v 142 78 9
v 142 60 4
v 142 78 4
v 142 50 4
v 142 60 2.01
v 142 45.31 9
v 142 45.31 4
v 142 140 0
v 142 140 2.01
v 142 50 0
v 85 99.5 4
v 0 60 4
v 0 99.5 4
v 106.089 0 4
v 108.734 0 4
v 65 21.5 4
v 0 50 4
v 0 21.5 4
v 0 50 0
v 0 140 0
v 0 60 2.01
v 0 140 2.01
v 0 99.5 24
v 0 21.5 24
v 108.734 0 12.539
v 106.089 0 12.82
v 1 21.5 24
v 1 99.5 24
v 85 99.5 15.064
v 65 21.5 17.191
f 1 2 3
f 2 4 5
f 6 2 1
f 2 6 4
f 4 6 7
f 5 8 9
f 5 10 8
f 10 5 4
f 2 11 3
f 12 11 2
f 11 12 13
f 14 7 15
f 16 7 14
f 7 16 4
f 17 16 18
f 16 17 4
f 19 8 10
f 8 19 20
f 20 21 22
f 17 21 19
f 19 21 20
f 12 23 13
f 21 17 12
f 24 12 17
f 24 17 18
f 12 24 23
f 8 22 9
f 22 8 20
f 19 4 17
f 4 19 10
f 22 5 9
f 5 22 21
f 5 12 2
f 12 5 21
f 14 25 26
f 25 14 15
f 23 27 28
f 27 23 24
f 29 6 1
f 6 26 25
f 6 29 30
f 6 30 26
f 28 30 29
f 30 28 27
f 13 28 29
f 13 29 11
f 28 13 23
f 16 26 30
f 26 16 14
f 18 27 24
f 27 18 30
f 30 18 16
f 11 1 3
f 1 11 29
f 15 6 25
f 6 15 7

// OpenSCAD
big_depth = 99.5;
big_width = 142;
min_height = 5;
max_height = 20;

module slab() {
  hull() {
    cube([big_width, big_depth, min_height]);
    cube([1,big_depth,max_height]);
  }
}

module front_remove() {
  linear_extrude(height=50, center=true, convexity=10, twist=0, slices=10, scale=1.0) {
  polygon(points=[[-1,-1],[108,-1],[65,21.5],[-1,21.5]]); 
  }
}

module back_remove() {
  linear_extrude(height=50, center=false, convexity=10, twist=0, slices=10, scale=1.0) {
  polygon(points=[[85,99.5],[142,78],[143,100]]);
  }
}

module side_remove() {
  linear_extrude(height=50, center=true, convexity=10, twist=0, slices=10, scale=1.0) {
  polygon(points=[[108,-1],[166,-1],[166,78]]);
  }
}

module clamp() {
  difference() {
    translate([0,50,-4])
      cube([142,90,4]);
    translate([-1,60,-1.99])
      cube([144,90,2]);
    }
  }

translate([0,0,4]) {
  difference() {
    union() {
      slab();
      clamp();
    }
    front_remove();
    back_remove();
    side_remove();
    }
  }
